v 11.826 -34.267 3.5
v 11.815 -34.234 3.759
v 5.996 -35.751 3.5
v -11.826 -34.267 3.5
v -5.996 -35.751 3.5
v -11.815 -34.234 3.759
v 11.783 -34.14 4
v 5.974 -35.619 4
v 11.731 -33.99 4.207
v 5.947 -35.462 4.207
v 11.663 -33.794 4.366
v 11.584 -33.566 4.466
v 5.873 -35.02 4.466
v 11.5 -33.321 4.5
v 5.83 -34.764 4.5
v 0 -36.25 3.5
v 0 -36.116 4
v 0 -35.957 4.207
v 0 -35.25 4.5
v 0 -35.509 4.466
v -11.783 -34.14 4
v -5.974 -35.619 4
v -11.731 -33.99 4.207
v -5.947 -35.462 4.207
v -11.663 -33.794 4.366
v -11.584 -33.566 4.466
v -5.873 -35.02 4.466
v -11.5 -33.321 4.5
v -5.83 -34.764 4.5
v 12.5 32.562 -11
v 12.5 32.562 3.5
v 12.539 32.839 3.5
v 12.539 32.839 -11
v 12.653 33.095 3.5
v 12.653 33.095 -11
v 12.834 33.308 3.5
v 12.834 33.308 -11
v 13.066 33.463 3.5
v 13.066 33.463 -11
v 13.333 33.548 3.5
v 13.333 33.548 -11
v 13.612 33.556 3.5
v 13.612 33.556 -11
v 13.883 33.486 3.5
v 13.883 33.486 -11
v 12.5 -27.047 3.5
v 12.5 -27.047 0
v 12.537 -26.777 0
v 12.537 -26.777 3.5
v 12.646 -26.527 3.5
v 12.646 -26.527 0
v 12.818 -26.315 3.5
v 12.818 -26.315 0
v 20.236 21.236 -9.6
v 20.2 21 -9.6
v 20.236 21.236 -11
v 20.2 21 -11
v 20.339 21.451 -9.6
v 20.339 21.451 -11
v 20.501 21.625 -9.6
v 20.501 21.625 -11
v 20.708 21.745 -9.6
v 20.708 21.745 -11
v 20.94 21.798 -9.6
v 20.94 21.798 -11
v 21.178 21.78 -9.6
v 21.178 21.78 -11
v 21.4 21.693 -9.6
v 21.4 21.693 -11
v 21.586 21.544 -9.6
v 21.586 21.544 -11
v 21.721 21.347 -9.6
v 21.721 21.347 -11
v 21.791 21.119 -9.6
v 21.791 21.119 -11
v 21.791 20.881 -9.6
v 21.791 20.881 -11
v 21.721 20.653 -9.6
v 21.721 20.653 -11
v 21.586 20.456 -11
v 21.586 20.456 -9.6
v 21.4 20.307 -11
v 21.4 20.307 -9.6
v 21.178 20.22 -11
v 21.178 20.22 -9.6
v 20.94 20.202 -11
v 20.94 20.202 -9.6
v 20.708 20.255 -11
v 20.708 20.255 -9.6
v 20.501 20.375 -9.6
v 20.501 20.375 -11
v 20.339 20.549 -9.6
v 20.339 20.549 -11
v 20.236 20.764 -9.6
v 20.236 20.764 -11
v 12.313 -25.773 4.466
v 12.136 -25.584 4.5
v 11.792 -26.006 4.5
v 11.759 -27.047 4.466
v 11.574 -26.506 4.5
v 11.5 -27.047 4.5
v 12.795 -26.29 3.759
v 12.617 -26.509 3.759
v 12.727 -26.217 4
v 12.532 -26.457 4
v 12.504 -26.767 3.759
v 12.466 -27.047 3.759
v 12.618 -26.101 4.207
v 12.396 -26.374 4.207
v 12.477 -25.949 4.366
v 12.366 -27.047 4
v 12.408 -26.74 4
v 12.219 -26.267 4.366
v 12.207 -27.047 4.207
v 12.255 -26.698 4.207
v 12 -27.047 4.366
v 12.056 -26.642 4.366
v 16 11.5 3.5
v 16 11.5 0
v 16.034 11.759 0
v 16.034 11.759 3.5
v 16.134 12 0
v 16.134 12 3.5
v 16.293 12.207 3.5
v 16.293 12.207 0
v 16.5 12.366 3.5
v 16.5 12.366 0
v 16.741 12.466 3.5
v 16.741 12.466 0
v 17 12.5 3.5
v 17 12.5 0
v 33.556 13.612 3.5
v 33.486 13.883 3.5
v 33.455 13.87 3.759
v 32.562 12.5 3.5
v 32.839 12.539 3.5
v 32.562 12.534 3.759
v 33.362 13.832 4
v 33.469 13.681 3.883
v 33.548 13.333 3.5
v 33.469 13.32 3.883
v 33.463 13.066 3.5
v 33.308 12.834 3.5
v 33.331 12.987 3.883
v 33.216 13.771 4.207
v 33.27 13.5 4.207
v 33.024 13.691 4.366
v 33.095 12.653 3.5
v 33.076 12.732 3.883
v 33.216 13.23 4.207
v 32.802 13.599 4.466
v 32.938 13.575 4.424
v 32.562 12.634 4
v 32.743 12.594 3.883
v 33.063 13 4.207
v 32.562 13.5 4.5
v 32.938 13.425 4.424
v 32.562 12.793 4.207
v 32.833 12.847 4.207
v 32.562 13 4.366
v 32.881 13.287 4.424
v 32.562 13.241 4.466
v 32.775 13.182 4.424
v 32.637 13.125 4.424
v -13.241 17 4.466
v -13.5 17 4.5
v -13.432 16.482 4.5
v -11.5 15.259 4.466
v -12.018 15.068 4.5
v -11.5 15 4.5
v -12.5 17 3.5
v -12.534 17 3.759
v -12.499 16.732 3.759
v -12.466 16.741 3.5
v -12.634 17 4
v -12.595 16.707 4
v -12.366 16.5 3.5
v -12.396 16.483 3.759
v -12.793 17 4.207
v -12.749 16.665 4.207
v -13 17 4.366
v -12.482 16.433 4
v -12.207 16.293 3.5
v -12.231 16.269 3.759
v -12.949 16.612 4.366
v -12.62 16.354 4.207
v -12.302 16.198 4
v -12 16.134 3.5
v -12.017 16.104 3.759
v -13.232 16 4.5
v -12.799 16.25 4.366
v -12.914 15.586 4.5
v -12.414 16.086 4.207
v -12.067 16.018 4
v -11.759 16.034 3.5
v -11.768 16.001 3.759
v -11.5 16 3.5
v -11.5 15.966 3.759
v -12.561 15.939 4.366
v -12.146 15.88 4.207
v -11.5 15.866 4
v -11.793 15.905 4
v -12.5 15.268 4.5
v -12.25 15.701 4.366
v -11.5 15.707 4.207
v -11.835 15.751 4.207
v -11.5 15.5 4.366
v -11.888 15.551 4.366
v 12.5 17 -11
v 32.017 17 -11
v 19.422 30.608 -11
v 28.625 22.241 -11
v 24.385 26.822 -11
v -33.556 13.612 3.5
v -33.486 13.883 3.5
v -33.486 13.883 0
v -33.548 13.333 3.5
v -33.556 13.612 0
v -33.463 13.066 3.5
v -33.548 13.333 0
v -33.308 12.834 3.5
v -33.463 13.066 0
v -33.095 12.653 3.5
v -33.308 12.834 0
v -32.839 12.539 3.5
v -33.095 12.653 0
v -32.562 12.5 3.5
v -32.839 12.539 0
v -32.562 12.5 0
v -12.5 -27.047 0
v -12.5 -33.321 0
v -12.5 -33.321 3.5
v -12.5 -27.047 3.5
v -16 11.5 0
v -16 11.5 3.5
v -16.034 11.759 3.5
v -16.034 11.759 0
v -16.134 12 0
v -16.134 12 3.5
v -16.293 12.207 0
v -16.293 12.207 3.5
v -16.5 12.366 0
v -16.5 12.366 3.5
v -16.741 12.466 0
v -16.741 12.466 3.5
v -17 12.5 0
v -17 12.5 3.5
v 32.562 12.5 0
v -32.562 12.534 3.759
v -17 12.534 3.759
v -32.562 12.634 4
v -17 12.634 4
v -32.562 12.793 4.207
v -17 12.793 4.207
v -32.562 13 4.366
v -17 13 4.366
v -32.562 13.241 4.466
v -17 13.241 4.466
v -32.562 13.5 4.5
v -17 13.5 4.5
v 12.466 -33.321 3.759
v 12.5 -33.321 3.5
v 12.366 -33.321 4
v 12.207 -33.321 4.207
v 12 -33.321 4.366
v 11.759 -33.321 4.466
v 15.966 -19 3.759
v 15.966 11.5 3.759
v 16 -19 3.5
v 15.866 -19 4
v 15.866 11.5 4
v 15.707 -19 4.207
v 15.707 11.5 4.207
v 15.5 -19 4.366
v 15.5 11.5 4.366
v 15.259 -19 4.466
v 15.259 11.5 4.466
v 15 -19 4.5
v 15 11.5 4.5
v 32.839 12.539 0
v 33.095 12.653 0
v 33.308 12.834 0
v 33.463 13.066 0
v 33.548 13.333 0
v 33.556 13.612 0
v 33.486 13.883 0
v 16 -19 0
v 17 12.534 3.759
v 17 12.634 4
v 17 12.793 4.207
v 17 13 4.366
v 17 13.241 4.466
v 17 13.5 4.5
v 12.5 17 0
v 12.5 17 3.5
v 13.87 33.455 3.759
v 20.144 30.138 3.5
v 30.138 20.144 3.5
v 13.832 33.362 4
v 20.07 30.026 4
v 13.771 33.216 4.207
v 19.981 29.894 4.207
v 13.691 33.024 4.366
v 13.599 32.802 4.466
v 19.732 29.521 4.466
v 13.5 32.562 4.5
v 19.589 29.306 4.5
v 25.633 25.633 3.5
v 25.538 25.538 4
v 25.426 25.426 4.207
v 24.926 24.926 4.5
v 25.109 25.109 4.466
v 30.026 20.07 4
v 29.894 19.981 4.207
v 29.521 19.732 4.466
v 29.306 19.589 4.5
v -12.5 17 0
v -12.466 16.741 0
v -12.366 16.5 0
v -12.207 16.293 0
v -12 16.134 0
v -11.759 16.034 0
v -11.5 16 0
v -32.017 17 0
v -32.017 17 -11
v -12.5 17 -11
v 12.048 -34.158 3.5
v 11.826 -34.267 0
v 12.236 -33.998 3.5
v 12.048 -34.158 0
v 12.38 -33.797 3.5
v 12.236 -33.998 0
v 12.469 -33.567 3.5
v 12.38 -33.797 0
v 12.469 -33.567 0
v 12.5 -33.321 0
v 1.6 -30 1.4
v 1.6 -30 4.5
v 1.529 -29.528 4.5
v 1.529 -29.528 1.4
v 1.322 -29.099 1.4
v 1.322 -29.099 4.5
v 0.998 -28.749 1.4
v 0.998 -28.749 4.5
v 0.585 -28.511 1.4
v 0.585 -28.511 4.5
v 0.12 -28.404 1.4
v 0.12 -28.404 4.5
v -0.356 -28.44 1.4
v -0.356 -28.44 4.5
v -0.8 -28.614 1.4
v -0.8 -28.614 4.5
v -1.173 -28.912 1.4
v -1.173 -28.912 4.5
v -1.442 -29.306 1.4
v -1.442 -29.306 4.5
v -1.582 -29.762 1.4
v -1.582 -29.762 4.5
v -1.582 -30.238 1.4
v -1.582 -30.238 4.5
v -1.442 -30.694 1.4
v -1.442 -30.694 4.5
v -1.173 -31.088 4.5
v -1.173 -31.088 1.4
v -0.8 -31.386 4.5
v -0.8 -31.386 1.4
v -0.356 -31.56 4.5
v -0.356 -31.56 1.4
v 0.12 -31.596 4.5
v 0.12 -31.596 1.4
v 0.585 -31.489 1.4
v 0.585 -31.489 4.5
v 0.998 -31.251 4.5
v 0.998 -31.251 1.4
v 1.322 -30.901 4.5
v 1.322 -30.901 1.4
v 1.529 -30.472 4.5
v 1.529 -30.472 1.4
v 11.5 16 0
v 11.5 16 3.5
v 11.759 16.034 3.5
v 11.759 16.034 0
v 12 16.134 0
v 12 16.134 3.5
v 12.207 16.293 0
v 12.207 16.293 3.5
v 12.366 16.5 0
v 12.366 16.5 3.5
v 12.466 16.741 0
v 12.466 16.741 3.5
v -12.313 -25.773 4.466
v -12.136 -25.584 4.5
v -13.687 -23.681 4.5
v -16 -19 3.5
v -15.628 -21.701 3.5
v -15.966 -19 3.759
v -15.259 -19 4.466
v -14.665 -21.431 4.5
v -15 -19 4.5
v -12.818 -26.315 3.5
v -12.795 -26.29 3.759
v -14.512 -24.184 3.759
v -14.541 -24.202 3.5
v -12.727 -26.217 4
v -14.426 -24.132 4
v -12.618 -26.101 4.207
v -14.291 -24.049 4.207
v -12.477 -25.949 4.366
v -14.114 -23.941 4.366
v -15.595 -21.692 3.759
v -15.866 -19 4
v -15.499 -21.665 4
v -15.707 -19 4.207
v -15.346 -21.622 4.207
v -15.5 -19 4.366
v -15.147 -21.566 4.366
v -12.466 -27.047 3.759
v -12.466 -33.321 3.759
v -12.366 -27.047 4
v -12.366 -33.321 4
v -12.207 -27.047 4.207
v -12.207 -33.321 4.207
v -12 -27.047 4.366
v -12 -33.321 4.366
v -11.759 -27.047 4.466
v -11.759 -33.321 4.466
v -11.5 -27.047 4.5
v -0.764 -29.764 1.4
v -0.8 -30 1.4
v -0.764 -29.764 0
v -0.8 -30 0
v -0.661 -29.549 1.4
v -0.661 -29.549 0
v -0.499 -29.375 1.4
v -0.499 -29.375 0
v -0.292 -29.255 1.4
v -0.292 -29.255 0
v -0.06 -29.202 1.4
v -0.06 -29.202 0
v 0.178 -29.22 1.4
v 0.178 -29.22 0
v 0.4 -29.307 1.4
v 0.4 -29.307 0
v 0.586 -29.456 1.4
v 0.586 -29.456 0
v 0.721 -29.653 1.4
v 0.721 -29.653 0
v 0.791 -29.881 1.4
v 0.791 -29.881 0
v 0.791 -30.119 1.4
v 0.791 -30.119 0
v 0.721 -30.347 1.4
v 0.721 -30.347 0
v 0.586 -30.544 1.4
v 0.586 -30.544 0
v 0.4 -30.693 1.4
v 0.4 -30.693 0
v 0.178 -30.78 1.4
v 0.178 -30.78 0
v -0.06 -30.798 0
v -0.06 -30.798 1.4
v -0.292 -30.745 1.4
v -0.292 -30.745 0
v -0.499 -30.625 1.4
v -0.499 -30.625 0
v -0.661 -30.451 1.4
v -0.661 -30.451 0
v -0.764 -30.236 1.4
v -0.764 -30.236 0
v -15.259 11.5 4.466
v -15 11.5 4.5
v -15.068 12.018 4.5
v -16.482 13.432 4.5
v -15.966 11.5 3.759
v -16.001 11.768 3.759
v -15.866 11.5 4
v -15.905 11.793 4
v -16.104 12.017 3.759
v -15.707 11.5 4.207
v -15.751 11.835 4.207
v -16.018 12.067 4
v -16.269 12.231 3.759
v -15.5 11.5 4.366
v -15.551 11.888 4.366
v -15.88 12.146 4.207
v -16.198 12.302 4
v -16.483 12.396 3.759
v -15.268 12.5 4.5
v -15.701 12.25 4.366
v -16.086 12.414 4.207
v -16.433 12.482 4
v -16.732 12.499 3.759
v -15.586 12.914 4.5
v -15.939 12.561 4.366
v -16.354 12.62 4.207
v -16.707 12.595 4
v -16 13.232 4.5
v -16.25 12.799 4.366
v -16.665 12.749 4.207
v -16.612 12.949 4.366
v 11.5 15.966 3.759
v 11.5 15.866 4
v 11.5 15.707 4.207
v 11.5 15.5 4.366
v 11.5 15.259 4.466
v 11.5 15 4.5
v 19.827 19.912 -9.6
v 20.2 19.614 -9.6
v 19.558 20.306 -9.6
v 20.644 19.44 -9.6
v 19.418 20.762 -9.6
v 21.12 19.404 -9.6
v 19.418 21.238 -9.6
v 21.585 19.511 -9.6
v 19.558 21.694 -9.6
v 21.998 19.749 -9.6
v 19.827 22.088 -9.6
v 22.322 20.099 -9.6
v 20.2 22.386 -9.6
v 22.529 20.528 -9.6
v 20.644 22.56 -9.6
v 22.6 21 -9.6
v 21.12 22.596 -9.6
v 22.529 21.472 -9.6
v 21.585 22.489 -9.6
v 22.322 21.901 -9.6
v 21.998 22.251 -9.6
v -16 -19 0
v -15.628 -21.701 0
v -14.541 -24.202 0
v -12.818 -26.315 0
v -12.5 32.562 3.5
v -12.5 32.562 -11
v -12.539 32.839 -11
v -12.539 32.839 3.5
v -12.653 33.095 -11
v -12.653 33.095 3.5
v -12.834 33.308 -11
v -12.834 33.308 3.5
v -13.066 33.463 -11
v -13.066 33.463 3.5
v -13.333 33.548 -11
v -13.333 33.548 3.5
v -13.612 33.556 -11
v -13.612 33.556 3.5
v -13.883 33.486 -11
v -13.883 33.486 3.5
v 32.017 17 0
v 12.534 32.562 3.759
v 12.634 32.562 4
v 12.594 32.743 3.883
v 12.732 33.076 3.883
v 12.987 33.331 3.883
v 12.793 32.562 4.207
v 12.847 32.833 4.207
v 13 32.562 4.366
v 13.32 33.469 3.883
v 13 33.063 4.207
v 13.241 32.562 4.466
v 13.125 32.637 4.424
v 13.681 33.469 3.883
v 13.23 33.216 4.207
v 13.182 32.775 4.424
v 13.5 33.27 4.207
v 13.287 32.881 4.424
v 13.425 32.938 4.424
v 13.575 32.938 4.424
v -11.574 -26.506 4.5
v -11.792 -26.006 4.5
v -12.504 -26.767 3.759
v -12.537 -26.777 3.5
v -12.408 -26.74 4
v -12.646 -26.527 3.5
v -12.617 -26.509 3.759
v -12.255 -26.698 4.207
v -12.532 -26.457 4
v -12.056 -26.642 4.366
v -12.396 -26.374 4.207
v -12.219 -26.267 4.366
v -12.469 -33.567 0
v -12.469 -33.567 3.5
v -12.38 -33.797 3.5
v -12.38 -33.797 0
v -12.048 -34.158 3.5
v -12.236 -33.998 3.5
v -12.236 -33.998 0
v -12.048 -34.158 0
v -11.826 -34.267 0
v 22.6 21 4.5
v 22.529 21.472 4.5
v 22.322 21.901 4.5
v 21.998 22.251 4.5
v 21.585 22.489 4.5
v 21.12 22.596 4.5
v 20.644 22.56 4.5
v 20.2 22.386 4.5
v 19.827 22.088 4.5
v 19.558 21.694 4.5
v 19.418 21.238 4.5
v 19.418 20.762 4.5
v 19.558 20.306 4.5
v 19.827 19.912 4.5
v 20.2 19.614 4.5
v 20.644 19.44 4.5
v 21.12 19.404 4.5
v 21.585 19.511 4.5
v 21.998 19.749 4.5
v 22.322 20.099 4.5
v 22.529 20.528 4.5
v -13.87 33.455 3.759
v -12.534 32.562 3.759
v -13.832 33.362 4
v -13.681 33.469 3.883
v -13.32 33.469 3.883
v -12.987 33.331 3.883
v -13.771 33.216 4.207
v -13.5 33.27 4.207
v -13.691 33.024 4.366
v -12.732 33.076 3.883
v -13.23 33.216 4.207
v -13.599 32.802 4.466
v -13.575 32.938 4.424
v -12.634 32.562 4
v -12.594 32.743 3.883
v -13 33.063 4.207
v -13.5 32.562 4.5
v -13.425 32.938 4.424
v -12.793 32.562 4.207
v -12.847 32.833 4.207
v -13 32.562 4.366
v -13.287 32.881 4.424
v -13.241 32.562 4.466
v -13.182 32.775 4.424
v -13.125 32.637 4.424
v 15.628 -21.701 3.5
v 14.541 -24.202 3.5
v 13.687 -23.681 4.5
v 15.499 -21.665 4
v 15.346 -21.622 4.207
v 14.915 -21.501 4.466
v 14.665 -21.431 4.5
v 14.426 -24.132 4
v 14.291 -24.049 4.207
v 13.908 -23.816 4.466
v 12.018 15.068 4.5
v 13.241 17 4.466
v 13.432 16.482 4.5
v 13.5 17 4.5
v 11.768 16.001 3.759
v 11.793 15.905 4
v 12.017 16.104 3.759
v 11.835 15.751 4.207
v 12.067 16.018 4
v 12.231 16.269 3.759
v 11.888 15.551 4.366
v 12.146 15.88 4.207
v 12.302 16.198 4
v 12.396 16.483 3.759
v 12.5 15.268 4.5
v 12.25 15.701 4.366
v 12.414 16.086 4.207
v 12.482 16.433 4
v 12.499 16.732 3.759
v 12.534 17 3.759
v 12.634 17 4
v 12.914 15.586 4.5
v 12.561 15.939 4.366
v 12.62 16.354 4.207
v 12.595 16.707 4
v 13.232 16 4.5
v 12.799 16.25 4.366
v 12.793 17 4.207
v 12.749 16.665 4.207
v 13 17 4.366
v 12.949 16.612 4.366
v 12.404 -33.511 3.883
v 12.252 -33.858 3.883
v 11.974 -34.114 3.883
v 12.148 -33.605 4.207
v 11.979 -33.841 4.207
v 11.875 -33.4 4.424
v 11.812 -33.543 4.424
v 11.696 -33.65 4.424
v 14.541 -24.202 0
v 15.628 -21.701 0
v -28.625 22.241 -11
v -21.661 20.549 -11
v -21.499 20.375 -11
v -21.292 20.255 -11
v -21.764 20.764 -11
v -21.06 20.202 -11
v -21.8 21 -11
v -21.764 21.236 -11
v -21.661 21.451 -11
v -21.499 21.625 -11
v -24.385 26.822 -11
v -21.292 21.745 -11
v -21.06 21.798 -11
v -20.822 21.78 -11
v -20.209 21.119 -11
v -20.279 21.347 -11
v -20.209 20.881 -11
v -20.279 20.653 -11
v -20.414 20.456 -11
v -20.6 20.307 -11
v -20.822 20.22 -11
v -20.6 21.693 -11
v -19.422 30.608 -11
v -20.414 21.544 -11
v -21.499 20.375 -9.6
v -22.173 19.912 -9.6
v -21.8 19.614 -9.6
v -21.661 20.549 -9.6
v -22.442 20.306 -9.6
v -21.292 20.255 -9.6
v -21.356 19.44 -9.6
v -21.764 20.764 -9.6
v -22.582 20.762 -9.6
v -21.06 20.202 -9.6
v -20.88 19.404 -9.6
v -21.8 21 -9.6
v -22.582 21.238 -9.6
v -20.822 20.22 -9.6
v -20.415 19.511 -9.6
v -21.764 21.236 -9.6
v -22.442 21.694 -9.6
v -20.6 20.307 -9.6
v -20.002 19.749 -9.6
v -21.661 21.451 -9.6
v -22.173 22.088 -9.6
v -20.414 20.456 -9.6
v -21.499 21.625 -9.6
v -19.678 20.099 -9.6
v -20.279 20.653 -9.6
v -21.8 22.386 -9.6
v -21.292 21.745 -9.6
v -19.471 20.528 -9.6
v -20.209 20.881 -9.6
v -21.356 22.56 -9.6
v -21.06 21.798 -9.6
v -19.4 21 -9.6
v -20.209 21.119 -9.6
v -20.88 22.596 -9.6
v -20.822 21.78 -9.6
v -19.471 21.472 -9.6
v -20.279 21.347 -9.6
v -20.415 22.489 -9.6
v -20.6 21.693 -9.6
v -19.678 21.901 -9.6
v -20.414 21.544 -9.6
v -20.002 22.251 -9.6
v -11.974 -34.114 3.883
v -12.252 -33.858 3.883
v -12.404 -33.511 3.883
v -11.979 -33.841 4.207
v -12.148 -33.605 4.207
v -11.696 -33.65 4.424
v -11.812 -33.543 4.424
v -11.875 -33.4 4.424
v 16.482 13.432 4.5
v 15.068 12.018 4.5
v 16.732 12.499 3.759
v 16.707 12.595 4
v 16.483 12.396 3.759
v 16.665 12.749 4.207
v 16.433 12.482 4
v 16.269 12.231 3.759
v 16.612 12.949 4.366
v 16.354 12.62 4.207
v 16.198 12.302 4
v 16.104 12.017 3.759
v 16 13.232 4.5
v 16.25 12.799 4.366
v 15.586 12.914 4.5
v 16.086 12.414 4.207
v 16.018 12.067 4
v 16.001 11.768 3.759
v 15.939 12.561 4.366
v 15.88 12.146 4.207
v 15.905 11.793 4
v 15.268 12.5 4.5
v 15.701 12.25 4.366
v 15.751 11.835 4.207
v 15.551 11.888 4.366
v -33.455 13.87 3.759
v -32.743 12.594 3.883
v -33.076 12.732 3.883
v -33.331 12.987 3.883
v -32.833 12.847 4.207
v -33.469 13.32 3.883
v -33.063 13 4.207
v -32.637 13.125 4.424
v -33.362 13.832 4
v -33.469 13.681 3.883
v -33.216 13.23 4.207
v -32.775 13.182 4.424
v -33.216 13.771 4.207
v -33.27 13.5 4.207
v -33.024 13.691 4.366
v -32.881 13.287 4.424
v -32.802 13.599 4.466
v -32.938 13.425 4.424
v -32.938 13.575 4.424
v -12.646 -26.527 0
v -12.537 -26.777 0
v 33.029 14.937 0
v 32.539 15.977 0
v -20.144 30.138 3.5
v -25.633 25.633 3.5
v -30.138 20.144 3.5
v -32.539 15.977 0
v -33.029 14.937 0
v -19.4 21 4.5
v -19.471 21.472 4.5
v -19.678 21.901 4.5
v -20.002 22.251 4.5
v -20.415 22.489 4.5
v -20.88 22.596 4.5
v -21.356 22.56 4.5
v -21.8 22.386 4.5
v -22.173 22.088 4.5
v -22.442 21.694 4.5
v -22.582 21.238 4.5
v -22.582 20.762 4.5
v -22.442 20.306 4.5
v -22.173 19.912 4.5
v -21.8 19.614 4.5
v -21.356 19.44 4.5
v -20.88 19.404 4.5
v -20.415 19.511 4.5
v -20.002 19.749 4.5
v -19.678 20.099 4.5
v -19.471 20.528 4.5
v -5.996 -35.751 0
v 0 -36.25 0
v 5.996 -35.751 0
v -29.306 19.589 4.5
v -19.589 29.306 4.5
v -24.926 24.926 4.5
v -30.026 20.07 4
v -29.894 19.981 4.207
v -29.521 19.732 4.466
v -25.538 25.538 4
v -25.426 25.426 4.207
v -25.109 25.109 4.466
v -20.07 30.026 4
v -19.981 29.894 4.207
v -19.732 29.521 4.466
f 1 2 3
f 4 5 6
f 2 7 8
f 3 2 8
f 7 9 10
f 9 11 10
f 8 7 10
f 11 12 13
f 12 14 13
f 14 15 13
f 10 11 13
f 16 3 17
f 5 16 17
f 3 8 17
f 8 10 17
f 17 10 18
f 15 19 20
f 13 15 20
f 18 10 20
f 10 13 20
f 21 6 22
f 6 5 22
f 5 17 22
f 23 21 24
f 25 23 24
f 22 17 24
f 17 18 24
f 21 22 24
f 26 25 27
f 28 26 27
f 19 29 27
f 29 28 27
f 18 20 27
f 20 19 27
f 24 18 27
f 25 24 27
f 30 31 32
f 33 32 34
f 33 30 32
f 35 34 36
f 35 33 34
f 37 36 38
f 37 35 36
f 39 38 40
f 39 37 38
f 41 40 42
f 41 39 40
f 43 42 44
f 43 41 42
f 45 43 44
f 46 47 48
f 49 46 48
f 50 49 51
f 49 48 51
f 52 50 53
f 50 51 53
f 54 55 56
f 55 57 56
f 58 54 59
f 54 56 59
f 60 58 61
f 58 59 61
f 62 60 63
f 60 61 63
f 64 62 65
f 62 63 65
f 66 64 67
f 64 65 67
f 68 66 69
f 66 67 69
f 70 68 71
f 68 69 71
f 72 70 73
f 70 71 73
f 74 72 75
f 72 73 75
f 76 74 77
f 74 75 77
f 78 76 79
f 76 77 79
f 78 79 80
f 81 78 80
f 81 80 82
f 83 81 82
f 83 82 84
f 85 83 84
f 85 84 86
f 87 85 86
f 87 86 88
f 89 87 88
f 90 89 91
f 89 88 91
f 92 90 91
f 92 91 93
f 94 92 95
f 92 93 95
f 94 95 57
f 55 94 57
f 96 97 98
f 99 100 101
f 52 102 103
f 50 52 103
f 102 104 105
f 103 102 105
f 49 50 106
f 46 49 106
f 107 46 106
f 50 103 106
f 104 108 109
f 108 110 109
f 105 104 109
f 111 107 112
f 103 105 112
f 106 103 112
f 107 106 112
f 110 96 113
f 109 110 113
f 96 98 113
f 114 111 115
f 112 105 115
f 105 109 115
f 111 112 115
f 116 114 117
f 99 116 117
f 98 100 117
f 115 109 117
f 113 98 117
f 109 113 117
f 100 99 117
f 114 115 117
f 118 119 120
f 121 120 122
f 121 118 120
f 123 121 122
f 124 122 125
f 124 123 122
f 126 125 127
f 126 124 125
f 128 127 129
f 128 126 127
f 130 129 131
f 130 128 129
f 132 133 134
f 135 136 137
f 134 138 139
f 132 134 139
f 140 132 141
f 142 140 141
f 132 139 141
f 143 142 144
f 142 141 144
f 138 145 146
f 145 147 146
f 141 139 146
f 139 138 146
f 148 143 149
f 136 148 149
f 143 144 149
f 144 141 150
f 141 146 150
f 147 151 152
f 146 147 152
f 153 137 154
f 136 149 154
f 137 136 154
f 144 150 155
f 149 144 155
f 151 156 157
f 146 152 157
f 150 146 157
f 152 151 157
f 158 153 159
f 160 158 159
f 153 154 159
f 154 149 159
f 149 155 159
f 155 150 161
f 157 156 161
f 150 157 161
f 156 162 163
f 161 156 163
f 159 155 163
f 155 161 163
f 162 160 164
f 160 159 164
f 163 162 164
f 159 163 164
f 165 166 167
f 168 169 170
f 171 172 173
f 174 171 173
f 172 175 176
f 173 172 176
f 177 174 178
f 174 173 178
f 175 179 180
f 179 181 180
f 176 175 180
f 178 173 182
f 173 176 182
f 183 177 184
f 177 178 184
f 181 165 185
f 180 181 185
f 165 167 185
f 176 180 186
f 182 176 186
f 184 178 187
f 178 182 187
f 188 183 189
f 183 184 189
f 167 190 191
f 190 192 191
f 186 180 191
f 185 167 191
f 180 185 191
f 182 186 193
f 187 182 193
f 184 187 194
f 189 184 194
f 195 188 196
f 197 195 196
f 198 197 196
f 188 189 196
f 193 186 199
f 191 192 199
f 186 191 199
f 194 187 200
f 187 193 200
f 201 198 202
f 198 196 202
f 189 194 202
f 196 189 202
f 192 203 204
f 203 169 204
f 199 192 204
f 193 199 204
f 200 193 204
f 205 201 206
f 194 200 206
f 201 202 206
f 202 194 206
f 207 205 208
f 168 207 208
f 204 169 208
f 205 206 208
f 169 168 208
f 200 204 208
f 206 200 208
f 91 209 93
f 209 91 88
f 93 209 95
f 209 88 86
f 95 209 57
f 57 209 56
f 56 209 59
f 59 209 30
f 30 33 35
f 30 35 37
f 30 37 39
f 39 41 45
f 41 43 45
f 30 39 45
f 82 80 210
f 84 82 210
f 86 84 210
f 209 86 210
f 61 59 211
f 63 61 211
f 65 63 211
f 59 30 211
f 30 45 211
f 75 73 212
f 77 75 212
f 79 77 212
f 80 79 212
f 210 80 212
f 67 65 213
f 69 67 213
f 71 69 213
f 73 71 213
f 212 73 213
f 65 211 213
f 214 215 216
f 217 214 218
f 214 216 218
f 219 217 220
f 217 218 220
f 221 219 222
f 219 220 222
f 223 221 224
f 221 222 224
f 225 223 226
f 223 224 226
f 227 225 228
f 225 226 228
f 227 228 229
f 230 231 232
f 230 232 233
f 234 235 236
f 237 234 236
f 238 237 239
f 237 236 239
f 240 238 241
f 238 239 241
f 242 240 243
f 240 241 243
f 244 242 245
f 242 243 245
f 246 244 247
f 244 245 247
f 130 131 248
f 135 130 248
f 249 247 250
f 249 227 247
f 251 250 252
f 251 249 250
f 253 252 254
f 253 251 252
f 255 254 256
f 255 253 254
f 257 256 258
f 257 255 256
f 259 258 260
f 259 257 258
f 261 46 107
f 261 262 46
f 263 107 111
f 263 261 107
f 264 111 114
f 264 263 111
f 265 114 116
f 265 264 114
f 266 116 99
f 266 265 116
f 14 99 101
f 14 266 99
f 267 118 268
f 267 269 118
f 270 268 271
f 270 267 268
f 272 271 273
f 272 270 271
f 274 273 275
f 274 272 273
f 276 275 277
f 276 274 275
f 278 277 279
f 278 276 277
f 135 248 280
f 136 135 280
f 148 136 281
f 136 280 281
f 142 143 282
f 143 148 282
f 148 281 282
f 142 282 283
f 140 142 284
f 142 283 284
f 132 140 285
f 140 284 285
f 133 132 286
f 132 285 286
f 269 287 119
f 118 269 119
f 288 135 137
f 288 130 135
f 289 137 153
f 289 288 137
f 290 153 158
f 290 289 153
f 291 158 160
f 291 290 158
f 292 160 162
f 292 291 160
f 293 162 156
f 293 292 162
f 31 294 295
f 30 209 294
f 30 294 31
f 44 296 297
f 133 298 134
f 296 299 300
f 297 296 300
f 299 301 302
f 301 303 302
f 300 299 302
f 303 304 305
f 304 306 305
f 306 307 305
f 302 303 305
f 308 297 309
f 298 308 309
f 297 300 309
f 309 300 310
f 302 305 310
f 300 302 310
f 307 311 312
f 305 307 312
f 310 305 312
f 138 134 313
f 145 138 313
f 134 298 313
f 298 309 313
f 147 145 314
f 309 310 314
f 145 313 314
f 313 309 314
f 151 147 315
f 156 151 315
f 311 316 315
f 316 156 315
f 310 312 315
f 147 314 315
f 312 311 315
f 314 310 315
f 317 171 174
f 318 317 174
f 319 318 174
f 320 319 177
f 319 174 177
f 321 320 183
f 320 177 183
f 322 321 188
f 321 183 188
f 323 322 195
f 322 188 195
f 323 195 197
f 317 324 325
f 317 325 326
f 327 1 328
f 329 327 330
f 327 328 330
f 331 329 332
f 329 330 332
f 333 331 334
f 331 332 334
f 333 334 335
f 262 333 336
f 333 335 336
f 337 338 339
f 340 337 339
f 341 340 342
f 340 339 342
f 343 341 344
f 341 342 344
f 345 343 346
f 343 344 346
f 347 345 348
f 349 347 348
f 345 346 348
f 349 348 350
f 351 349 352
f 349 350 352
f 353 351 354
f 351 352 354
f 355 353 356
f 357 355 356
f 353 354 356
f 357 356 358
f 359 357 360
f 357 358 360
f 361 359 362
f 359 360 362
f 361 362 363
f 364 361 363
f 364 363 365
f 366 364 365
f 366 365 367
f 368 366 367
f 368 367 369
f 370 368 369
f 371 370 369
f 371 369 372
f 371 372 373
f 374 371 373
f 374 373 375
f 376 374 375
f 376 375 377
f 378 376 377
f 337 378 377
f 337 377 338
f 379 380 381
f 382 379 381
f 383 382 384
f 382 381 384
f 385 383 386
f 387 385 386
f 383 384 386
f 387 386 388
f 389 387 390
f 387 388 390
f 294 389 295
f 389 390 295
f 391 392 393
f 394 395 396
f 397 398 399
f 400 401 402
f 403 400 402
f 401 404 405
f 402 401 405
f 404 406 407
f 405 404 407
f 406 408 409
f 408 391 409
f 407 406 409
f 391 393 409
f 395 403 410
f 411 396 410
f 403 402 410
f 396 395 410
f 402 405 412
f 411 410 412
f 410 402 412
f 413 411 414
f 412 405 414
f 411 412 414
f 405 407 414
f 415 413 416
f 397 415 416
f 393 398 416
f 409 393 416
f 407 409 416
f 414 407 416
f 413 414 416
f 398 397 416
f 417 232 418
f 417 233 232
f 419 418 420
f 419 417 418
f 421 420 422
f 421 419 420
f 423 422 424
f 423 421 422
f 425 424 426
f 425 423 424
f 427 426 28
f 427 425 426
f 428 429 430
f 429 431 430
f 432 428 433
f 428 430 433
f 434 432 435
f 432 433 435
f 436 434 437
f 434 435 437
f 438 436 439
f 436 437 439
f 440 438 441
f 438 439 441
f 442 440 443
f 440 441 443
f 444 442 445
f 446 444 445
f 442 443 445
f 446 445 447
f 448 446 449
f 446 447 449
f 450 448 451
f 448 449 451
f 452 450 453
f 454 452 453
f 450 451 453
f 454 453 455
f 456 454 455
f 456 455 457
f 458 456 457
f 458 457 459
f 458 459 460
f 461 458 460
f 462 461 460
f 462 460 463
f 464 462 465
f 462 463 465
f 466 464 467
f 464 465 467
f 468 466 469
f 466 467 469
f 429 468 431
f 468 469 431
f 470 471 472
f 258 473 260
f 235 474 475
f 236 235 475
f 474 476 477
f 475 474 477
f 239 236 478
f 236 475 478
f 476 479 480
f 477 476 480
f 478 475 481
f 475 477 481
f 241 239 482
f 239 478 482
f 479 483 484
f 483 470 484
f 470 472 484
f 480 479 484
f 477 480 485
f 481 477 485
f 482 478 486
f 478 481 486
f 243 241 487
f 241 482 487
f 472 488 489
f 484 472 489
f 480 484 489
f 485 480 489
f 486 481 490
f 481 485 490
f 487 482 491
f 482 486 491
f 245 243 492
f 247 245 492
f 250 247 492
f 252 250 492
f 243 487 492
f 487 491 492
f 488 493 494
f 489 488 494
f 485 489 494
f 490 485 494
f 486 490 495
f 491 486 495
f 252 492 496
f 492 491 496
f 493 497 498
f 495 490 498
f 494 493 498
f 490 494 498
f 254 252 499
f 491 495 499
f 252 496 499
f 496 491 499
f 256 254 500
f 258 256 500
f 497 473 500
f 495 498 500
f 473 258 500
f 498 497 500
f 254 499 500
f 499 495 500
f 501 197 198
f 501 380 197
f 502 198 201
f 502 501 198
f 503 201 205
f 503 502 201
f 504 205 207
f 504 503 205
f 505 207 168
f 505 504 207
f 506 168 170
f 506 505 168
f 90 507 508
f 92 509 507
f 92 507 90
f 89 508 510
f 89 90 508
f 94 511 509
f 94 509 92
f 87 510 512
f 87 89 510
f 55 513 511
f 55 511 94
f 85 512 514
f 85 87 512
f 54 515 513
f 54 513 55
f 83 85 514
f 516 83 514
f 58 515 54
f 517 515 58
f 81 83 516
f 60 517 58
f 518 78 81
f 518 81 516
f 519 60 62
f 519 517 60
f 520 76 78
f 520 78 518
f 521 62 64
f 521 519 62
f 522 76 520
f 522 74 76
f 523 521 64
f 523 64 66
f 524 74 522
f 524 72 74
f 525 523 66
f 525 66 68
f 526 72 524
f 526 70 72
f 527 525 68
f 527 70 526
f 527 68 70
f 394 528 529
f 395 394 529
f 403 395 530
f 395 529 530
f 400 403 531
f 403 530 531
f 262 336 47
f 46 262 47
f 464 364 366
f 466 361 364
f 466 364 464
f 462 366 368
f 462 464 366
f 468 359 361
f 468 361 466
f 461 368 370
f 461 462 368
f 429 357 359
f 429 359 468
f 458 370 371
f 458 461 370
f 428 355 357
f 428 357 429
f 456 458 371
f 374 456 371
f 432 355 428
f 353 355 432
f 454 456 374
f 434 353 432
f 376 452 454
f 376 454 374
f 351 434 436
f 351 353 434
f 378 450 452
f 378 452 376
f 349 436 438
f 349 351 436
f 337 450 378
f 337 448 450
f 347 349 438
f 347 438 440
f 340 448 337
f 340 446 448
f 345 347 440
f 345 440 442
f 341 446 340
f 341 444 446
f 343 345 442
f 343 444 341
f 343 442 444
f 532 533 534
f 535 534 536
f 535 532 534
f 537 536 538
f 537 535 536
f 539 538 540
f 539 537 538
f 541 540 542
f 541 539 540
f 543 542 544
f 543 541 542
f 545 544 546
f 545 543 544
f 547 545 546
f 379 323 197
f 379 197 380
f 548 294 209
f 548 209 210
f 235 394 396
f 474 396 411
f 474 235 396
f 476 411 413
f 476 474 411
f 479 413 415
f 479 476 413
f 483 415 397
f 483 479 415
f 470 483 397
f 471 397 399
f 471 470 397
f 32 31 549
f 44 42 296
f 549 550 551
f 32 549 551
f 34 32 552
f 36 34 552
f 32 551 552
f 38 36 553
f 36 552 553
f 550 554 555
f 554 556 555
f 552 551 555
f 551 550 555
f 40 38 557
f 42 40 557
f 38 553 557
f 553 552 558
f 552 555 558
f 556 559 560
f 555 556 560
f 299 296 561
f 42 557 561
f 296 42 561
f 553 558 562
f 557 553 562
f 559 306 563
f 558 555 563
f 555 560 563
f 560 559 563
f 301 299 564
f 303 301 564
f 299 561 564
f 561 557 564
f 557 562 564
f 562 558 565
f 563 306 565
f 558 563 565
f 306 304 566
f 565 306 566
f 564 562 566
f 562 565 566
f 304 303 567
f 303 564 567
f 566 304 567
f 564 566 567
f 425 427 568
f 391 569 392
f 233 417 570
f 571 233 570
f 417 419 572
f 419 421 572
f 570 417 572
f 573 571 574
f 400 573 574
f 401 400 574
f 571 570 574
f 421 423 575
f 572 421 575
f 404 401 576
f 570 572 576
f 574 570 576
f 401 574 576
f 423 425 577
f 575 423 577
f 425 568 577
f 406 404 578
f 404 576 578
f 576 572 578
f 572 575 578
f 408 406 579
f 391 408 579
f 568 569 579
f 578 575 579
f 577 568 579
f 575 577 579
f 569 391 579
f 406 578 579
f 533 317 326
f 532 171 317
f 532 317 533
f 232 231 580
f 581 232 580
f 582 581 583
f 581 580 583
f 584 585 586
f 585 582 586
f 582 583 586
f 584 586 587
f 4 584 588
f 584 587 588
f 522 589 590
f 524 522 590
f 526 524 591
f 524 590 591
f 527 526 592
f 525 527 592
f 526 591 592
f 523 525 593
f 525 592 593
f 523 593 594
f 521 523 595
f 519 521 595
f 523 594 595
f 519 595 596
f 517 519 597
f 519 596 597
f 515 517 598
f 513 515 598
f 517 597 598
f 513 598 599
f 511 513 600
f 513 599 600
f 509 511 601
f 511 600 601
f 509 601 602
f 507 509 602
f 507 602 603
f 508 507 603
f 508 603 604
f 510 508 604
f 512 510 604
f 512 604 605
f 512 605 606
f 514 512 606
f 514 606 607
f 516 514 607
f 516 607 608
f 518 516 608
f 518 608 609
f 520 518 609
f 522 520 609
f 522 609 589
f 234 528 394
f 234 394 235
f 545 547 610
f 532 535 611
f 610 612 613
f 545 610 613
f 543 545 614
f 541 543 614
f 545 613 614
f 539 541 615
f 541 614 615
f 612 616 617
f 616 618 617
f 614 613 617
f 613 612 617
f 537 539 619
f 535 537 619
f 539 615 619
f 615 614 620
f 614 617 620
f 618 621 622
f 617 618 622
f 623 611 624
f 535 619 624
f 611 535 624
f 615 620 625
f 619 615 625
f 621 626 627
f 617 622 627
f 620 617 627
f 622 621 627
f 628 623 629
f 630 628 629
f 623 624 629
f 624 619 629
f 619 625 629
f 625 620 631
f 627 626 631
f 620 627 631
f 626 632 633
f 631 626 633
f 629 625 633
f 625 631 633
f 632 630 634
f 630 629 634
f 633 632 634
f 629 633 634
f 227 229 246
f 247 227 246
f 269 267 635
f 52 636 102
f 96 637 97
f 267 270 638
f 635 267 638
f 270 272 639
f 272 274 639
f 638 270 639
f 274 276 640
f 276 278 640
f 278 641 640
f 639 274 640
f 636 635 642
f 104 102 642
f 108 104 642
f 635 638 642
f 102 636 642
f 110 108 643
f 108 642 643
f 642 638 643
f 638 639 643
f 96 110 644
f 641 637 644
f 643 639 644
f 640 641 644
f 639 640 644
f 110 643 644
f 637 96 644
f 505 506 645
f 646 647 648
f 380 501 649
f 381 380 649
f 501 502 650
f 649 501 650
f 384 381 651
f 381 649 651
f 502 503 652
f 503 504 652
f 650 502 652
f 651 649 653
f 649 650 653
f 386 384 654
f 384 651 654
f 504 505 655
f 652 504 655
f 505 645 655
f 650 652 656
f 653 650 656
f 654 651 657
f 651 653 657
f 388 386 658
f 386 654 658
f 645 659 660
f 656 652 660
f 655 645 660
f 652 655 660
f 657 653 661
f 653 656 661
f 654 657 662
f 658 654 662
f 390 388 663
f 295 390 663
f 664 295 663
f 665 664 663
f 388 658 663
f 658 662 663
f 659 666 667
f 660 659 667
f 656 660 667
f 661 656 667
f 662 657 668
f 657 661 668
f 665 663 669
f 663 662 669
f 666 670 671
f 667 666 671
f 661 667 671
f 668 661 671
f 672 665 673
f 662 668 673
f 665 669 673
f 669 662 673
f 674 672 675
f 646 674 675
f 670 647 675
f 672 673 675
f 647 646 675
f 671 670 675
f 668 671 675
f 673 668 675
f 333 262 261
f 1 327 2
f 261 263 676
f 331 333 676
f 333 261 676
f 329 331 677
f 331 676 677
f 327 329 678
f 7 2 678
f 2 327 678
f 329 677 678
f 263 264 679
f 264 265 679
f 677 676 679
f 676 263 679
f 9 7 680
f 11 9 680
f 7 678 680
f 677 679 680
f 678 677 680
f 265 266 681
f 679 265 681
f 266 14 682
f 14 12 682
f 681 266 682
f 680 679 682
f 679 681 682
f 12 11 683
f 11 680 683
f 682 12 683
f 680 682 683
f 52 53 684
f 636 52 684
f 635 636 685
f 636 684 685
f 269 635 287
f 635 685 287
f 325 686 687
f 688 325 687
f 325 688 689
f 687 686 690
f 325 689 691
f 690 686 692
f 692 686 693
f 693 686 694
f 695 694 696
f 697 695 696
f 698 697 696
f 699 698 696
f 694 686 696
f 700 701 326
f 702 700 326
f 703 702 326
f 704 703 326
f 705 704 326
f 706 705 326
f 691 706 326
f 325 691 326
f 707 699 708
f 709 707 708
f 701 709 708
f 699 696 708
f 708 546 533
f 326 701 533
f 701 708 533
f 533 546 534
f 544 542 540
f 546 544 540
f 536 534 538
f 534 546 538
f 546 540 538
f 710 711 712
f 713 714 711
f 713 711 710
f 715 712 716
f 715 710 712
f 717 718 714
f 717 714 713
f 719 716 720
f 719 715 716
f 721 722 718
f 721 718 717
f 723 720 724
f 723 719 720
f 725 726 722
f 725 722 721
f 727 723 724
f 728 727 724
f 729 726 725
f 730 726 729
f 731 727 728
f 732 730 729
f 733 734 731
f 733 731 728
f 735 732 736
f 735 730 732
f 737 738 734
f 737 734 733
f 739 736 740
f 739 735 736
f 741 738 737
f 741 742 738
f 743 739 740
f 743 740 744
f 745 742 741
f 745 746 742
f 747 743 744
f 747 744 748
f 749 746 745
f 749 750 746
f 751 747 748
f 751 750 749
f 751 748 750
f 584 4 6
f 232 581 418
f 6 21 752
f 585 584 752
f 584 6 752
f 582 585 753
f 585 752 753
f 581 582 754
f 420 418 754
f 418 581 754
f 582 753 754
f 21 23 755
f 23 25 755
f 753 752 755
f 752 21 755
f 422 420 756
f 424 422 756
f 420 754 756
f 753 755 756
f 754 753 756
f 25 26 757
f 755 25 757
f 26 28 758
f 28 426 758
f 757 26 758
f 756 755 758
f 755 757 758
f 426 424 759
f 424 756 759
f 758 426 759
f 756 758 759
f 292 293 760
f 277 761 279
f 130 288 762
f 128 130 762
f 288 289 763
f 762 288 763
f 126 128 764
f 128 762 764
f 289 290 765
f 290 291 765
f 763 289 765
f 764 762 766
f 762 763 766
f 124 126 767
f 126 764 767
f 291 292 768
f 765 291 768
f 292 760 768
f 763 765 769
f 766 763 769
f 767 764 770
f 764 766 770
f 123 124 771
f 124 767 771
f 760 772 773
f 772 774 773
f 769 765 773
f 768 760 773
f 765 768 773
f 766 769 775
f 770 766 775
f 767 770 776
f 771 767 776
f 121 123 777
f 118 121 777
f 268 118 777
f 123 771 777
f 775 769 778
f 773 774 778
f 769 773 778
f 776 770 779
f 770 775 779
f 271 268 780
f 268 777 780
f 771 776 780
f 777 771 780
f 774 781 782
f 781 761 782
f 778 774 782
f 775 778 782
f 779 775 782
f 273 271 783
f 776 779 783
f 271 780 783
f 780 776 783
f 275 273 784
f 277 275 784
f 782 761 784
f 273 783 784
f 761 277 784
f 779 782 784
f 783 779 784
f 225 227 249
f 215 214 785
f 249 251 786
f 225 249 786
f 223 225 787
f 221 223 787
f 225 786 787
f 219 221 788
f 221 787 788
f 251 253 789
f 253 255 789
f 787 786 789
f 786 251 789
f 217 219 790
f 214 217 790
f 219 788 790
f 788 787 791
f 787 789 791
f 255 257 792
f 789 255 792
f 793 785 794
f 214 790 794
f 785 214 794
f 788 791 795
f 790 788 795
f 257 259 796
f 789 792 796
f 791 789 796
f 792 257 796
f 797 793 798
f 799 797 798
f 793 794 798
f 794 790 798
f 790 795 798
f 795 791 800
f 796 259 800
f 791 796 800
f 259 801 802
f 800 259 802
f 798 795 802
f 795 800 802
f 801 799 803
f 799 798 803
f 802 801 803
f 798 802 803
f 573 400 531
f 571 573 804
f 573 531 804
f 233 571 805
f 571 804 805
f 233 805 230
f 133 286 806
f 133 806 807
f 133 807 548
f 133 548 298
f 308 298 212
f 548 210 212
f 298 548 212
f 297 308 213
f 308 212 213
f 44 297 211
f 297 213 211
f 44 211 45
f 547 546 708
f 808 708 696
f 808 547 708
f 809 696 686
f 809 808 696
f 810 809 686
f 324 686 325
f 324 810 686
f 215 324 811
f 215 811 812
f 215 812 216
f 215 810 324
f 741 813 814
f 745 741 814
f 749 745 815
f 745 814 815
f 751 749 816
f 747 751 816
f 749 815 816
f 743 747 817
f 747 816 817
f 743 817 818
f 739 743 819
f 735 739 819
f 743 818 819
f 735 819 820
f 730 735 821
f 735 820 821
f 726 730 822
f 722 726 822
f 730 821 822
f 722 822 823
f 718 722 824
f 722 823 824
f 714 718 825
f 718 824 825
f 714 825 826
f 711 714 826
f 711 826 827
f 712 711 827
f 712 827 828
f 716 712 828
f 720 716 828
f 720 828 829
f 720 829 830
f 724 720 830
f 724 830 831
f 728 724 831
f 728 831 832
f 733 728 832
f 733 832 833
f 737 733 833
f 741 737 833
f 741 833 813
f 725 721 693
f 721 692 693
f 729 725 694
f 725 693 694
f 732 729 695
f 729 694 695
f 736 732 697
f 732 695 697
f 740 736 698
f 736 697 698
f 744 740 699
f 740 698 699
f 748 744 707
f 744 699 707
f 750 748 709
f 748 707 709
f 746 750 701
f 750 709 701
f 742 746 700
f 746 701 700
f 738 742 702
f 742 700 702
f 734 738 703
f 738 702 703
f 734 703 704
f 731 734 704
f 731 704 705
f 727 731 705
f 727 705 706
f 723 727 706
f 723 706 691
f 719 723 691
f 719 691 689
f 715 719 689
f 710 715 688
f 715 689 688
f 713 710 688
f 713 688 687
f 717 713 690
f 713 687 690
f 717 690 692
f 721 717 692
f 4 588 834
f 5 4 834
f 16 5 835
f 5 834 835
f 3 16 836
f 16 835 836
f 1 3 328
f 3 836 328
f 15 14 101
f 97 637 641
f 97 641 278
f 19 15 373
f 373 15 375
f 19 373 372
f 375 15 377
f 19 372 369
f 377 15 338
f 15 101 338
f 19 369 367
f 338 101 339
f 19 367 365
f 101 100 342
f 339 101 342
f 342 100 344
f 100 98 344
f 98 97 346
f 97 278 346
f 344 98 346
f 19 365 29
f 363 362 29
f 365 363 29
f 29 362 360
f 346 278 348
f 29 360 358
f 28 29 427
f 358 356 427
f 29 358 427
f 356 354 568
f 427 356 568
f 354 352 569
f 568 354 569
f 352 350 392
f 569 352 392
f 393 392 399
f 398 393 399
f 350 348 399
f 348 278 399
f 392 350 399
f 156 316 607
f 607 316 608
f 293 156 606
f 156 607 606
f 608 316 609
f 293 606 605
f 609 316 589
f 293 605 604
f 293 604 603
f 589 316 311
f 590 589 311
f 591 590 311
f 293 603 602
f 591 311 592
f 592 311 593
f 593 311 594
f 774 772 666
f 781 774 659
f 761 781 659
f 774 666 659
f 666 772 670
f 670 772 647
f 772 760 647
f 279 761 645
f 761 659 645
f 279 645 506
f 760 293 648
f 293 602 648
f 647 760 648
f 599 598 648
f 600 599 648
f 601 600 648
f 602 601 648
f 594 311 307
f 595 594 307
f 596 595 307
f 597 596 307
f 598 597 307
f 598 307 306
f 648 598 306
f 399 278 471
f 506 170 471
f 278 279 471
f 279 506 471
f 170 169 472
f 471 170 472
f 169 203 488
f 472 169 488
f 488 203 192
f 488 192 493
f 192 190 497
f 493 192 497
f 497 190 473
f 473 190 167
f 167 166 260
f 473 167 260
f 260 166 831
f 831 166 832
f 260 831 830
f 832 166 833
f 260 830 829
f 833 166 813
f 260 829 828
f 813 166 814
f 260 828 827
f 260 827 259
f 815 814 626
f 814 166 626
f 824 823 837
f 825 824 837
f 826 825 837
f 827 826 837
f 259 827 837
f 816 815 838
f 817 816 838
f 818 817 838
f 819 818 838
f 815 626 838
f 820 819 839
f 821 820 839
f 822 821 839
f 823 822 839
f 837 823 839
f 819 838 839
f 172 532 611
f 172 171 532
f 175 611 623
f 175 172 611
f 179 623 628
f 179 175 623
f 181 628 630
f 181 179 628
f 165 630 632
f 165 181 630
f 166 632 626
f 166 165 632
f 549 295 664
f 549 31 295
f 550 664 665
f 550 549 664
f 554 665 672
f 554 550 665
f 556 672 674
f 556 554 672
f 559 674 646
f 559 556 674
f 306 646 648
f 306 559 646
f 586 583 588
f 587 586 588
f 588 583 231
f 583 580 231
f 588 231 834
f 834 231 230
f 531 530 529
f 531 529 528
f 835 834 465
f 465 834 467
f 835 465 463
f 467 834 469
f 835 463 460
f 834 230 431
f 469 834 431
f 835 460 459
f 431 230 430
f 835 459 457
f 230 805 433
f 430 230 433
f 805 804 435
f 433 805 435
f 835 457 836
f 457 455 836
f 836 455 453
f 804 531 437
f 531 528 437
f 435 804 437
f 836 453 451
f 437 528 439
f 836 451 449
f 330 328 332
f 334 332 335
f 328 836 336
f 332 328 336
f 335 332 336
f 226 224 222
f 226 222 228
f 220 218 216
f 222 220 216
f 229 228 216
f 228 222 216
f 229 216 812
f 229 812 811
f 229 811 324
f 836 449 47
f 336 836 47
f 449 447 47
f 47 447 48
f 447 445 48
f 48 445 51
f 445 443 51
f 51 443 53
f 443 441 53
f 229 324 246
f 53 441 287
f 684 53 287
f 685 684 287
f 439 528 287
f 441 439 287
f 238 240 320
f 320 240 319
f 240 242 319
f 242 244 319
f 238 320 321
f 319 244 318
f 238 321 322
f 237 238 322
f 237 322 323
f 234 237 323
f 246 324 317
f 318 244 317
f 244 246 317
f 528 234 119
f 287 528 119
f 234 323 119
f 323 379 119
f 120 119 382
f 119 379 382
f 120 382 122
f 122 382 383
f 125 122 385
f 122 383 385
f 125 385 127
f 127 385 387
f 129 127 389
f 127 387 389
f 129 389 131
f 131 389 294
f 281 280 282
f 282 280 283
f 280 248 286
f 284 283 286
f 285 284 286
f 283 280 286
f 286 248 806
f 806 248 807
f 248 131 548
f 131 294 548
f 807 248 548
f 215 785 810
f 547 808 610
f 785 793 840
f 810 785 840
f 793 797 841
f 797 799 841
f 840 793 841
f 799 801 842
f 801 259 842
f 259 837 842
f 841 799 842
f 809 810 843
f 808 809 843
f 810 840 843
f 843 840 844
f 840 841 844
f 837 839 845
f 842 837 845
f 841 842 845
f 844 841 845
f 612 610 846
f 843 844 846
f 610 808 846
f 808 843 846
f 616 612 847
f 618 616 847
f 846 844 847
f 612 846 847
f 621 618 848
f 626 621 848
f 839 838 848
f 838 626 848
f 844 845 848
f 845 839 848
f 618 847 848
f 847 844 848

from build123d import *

# Parameters (mm, degrees)
SKETCH_1_R                = 36.25
EXTRUDE_1_DEPTH           = 10
SKETCH_2_W                = 25
SKETCH_2_H                = 20.25
CUT_EXTRUDE_1_DEPTH       = 4.5
SKETCH_3_W                = 23.75
SKETCH_3_H                = 48.75
CUT_EXTRUDE_2_DEPTH       = 4.5
SKETCH_4_R                = 10
EXTRUDE_2_DEPTH           = 4.5
SKETCH_5_R                = 10
EXTRUDE_3_DEPTH           = 4.5
SKETCH_6_W                = 32
SKETCH_6_H                = 31.5
EXTRUDE_4_DEPTH           = 4.5
SKETCH_7_R                = 36.25
CUT_EXTRUDE_3_DEPTH       = 5.5
SKETCH_8_W                = 23.75
SKETCH_8_H                = 19.25
EXTRUDE_5_DEPTH           = 11
SKETCH_9_OUTSIDE_W        = 95.24
SKETCH_9_OUTSIDE_H        = 95.24
SKETCH_9_OUTSIDE_R        = 36.25
CUT_EXTRUDE_4_DEPTH       = 11
HOLE_WIZARD_1_D           = 1.6
HOLE_WIZARD_1_DEPTH       = 100
HOLE_WIZARD_1_CBORE_D     = 3.2
HOLE_WIZARD_1_CBORE_DEPTH = 14.1
HOLE_WIZARD_2_D           = 1.6
HOLE_WIZARD_2_DEPTH       = 100
HOLE_WIZARD_2_CBORE_D     = 3.2
HOLE_WIZARD_2_CBORE_DEPTH = 3.1
FILLET_1_R                = 1
FILLET_2_R                = 1


with BuildPart() as part:
    # 草图1 → 凸台-拉伸1 (new body)
    with BuildSketch(Plane.XY):
        Circle(SKETCH_1_R)
    extrude(amount=EXTRUDE_1_DEPTH)

    # 草图2 → 切除-拉伸1 (cut)
    with BuildSketch(Plane.XY):
        with Locations((0, 26.125)):
            Rectangle(SKETCH_2_W, SKETCH_2_H)
    extrude(amount=CUT_EXTRUDE_1_DEPTH, mode=Mode.SUBTRACT)

    # 草图3 → 切除-拉伸2 (cut)
    with BuildSketch(Plane.XY):
        with Locations((-24.375, -11.875)):
            Rectangle(SKETCH_3_W, SKETCH_3_H)
        with Locations((24.375, -11.875)):
            Rectangle(SKETCH_3_W, SKETCH_3_H)
    extrude(amount=CUT_EXTRUDE_2_DEPTH, mode=Mode.SUBTRACT)

    # 草图4 → 凸台-拉伸2 (add)
    with BuildSketch(Plane.XY):
        with Locations((-6, -19)):
            Circle(SKETCH_4_R)
    extrude(amount=EXTRUDE_2_DEPTH)

    # 草图5 → 凸台-拉伸3 (add)
    with BuildSketch(Plane.XY):
        with Locations((6, -19)):
            Circle(SKETCH_5_R)
    extrude(amount=EXTRUDE_3_DEPTH)

    # 草图6 → 凸台-拉伸4 (add)
    with BuildSketch(Plane.XY):
        with Locations((0, -3.25)):
            Rectangle(SKETCH_6_W, SKETCH_6_H)
    extrude(amount=EXTRUDE_4_DEPTH)

    # 草图7 → 切除-拉伸3 (cut)
    with BuildSketch(Plane(origin=(0, 0, 4.5), x_dir=(-1, 0, 0), z_dir=(0, 0, -1))):
        Circle(SKETCH_7_R)
    extrude(amount=-CUT_EXTRUDE_3_DEPTH, mode=Mode.SUBTRACT)

    # 草图8 → 凸台-拉伸5 (add)
    with BuildSketch(Plane.XY):
        with Locations((-24.375, 26.625)):
            Rectangle(SKETCH_8_W, SKETCH_8_H)
        with Locations((24.375, 26.625)):
            Rectangle(SKETCH_8_W, SKETCH_8_H)
    extrude(amount=-EXTRUDE_5_DEPTH)

    # 草图9 outside → 切除-拉伸4 (cut)
    with BuildSketch(Plane.XY):
        Rectangle(SKETCH_9_OUTSIDE_W, SKETCH_9_OUTSIDE_H)
        Circle(SKETCH_9_OUTSIDE_R, mode=Mode.SUBTRACT)
    extrude(amount=-CUT_EXTRUDE_4_DEPTH, mode=Mode.SUBTRACT)

    # 孔1
    with Locations(Plane.XY.offset(4.5)):
        with Locations((-21, 21), (21, 21)):
            CounterBoreHole(HOLE_WIZARD_1_D / 2, HOLE_WIZARD_1_CBORE_D / 2, HOLE_WIZARD_1_CBORE_DEPTH, depth=HOLE_WIZARD_1_DEPTH)

    # 孔2
    with Locations(Plane.XY.offset(4.5)):
        with Locations((0, -30)):
            CounterBoreHole(HOLE_WIZARD_2_D / 2, HOLE_WIZARD_2_CBORE_D / 2, HOLE_WIZARD_2_CBORE_DEPTH, depth=HOLE_WIZARD_2_DEPTH)

    # 圆角1
    fillet_1_edges = [part.edges().sort_by_distance(p)[0] for p in [
        (-16, 12.5, 2.25),
        (16, 12.5, 2.25),
        (12.5, 16, 2.25),
        (-12.5, 34.026643972, -3.25),
        (-12.5, 16, 2.25),
        (12.5, 34.026643972, -3.25),
        (-12.5, -34.026643972, 2.25),
        (-34.026643972, 12.5, 2.25),
        (12.5, -34.026643972, 2.25),
        (34.026643972, 12.5, 2.25),
        (-12.5, -26.599342077, 2.25),
        (12.5, -26.599342077, 2.25),
    ]]
    fillet(fillet_1_edges, radius=FILLET_1_R)

    # 圆角2
    fillet_2_edges = [part.edges().sort_by_distance(p)[0] for p in [
        (-16.292893219, 12.207106781, 4.5),
        (-24.78122001, 12.5, 4.5),
        (-33.393998413, 12.94456266, 4.5),
        (0, -36.25, 4.5),
        (-12.94456266, 33.393998413, 4.5),
        (-12.5, 24.78122001, 4.5),
        (-12.207106781, 16.292893219, 4.5),
        (0, 16, 4.5),
        (12.207106781, 16.292893219, 4.5),
        (12.5, 24.78122001, 4.5),
        (12.94456266, 33.393998413, 4.5),
        (33.393998413, 12.94456266, 4.5),
        (24.78122001, 12.5, 4.5),
        (16.292893219, 12.207106781, 4.5),
        (16, -3.75, 4.5),
        (15.170109546, -22.988620176, 4.5),
        (12.582989045, -26.647876452, 4.5),
        (12.5, -30.184045242, 4.5),
        (12.314322152, -33.90176517, 4.5),
        (-12.314322152, -33.90176517, 4.5),
        (-12.5, -30.184045242, 4.5),
        (-12.582989045, -26.647876452, 4.5),
        (-15.170109546, -22.988620176, 4.5),
        (-16, -3.75, 4.5),
    ]]
    fillet(fillet_2_edges, radius=FILLET_2_R)


solid = part.part
